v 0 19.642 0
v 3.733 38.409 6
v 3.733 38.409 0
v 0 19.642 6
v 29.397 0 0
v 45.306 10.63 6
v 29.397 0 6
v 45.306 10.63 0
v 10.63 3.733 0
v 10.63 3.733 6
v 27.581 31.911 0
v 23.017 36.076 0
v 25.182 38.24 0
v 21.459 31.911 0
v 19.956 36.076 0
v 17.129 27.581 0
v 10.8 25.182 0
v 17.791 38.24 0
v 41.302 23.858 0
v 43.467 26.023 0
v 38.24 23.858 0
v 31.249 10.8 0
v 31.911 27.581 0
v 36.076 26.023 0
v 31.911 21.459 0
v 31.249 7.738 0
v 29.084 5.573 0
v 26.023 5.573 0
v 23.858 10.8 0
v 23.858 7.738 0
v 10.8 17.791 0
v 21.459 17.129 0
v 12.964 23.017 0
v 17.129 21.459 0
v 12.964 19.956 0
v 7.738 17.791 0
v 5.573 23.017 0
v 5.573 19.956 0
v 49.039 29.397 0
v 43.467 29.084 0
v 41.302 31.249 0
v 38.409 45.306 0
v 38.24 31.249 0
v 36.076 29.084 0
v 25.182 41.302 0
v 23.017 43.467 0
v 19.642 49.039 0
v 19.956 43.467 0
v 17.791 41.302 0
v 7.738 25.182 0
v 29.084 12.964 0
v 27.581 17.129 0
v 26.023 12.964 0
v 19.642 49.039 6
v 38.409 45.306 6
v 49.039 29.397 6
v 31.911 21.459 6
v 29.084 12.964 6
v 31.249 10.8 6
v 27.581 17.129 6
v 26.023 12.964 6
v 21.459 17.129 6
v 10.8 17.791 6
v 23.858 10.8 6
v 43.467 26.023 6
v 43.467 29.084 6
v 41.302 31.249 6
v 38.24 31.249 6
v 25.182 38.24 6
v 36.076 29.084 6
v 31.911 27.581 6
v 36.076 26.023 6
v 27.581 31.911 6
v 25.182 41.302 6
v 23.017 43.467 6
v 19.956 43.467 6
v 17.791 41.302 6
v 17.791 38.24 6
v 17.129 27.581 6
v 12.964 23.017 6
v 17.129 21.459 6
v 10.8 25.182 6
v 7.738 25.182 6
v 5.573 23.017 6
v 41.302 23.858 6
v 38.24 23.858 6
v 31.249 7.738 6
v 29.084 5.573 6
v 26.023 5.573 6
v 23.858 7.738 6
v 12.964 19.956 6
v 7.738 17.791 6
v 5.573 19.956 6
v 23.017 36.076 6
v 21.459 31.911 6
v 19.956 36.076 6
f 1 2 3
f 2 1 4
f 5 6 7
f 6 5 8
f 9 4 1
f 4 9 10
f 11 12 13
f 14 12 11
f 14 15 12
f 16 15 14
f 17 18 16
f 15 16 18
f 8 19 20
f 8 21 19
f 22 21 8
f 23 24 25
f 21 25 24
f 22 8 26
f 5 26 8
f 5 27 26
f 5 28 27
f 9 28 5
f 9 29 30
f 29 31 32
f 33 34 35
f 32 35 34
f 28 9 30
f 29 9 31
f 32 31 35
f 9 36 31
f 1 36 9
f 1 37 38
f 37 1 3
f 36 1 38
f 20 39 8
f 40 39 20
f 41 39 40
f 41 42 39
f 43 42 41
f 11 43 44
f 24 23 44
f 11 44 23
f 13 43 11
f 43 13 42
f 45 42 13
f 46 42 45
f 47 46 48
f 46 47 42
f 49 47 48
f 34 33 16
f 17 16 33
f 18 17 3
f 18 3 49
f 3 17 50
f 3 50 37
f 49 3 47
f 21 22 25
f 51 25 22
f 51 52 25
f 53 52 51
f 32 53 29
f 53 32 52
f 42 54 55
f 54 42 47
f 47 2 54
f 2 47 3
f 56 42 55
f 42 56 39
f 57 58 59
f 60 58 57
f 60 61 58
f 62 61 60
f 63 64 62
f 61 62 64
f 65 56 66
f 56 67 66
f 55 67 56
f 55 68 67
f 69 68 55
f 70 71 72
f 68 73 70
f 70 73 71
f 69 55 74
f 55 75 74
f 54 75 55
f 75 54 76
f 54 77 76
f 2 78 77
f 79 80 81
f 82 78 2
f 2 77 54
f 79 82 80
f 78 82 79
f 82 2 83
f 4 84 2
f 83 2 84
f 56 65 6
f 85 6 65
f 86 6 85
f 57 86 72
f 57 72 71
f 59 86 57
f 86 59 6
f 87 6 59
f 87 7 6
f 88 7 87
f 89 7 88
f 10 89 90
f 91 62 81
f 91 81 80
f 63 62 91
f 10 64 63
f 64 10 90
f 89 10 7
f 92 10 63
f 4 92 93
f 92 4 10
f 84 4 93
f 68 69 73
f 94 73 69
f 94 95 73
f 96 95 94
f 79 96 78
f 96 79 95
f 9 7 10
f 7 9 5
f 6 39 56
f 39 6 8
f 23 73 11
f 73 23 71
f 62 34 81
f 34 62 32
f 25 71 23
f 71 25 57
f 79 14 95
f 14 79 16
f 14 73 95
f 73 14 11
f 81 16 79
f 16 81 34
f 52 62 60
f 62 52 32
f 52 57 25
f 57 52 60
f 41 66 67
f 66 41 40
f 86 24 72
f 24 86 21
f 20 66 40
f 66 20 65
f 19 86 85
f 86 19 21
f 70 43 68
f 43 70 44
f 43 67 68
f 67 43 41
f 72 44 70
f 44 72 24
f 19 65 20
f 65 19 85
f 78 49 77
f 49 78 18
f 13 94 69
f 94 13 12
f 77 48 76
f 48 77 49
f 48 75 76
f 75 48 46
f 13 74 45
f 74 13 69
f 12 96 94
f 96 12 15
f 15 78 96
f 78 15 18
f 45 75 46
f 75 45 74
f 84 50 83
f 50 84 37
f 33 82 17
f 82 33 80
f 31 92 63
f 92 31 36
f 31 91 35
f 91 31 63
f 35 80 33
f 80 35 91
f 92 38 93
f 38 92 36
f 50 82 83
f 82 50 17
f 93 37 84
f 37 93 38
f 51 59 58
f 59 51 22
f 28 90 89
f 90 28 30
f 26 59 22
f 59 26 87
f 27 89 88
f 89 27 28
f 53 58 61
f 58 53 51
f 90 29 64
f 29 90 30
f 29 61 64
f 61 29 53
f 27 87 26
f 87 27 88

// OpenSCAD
$fn = 32;

// ----------------------------------------------------------------------
// Polygon plate: 8-gon R25, 4 bolt windows
// ----------------------------------------------------------------------

// --- parameters (mm) ---
sides = 8;                // number of polygon sides
plate_r = 25;             // circumscribed radius of the polygon
bore_r = 8;               // centre bore radius
bolts = 4;                // number of bolt windows
ring_r = 15.55;           // bolt-circle radius
bolt_r = 4;               // bolt window radius
plate_t = 6;              // plate thickness, Z (extrusion height)

plate_d = 2 * plate_r;  // circumscribed diameter
bore_d = 2 * bore_r;  // centre bore diameter
bolt_d = 2 * bolt_r;  // bolt window diameter
ring_d = 2 * ring_r;  // bolt-circle diameter

profile = [[49.039, 29.397], [38.409, 45.306], [19.642, 49.039], [3.733, 38.409], [0, 19.642], [10.63, 3.733], [29.397, 0], [45.306, 10.63]];  // primary outline, 8 points, counter clockwise
void_1 = [[31.911, 27.581], [27.581, 31.911], [21.459, 31.911], [17.129, 27.581], [17.129, 21.459], [21.459, 17.129], [27.581, 17.129], [31.911, 21.459]];  // centre bore, 8 points
void_2 = [[43.467, 29.084], [41.302, 31.249], [38.24, 31.249], [36.076, 29.084], [36.076, 26.023], [38.24, 23.858], [41.302, 23.858], [43.467, 26.023]];  // bolt window 1, 8 points
void_3 = [[25.182, 41.302], [23.017, 43.467], [19.956, 43.467], [17.791, 41.302], [17.791, 38.24], [19.956, 36.076], [23.017, 36.076], [25.182, 38.24]];  // bolt window 2, 8 points
void_4 = [[12.964, 23.017], [10.8, 25.182], [7.738, 25.182], [5.573, 23.017], [5.573, 19.956], [7.738, 17.791], [10.8, 17.791], [12.964, 19.956]];  // bolt window 3, 8 points
void_5 = [[31.249, 10.8], [29.084, 12.964], [26.023, 12.964], [23.858, 10.8], [23.858, 7.738], [26.023, 5.573], [29.084, 5.573], [31.249, 7.738]];  // bolt window 4, 8 points

// --- the one profile operation ---
difference() {
  linear_extrude(height = plate_t) polygon(points = profile);
  translate([0, 0, -1])
    linear_extrude(height = plate_t + 2) polygon(points = void_1);
  translate([0, 0, -1])
    linear_extrude(height = plate_t + 2) polygon(points = void_2);
  translate([0, 0, -1])
    linear_extrude(height = plate_t + 2) polygon(points = void_3);
  translate([0, 0, -1])
    linear_extrude(height = plate_t + 2) polygon(points = void_4);
  translate([0, 0, -1])
    linear_extrude(height = plate_t + 2) polygon(points = void_5);
}
